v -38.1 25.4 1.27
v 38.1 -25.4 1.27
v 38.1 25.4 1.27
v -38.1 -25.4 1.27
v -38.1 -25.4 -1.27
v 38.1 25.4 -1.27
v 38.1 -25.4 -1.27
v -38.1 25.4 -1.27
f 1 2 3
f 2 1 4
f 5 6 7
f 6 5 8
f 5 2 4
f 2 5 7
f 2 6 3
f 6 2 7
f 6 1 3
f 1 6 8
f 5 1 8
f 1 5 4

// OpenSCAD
// ========================================
// a 3 by 2 by 0.1 inch plate
// NeuroCAD canonical IR; dimensions are millimetres
// ========================================
$fn = 48;

cube(size=[76.2, 50.8, 2.54], center=true);
